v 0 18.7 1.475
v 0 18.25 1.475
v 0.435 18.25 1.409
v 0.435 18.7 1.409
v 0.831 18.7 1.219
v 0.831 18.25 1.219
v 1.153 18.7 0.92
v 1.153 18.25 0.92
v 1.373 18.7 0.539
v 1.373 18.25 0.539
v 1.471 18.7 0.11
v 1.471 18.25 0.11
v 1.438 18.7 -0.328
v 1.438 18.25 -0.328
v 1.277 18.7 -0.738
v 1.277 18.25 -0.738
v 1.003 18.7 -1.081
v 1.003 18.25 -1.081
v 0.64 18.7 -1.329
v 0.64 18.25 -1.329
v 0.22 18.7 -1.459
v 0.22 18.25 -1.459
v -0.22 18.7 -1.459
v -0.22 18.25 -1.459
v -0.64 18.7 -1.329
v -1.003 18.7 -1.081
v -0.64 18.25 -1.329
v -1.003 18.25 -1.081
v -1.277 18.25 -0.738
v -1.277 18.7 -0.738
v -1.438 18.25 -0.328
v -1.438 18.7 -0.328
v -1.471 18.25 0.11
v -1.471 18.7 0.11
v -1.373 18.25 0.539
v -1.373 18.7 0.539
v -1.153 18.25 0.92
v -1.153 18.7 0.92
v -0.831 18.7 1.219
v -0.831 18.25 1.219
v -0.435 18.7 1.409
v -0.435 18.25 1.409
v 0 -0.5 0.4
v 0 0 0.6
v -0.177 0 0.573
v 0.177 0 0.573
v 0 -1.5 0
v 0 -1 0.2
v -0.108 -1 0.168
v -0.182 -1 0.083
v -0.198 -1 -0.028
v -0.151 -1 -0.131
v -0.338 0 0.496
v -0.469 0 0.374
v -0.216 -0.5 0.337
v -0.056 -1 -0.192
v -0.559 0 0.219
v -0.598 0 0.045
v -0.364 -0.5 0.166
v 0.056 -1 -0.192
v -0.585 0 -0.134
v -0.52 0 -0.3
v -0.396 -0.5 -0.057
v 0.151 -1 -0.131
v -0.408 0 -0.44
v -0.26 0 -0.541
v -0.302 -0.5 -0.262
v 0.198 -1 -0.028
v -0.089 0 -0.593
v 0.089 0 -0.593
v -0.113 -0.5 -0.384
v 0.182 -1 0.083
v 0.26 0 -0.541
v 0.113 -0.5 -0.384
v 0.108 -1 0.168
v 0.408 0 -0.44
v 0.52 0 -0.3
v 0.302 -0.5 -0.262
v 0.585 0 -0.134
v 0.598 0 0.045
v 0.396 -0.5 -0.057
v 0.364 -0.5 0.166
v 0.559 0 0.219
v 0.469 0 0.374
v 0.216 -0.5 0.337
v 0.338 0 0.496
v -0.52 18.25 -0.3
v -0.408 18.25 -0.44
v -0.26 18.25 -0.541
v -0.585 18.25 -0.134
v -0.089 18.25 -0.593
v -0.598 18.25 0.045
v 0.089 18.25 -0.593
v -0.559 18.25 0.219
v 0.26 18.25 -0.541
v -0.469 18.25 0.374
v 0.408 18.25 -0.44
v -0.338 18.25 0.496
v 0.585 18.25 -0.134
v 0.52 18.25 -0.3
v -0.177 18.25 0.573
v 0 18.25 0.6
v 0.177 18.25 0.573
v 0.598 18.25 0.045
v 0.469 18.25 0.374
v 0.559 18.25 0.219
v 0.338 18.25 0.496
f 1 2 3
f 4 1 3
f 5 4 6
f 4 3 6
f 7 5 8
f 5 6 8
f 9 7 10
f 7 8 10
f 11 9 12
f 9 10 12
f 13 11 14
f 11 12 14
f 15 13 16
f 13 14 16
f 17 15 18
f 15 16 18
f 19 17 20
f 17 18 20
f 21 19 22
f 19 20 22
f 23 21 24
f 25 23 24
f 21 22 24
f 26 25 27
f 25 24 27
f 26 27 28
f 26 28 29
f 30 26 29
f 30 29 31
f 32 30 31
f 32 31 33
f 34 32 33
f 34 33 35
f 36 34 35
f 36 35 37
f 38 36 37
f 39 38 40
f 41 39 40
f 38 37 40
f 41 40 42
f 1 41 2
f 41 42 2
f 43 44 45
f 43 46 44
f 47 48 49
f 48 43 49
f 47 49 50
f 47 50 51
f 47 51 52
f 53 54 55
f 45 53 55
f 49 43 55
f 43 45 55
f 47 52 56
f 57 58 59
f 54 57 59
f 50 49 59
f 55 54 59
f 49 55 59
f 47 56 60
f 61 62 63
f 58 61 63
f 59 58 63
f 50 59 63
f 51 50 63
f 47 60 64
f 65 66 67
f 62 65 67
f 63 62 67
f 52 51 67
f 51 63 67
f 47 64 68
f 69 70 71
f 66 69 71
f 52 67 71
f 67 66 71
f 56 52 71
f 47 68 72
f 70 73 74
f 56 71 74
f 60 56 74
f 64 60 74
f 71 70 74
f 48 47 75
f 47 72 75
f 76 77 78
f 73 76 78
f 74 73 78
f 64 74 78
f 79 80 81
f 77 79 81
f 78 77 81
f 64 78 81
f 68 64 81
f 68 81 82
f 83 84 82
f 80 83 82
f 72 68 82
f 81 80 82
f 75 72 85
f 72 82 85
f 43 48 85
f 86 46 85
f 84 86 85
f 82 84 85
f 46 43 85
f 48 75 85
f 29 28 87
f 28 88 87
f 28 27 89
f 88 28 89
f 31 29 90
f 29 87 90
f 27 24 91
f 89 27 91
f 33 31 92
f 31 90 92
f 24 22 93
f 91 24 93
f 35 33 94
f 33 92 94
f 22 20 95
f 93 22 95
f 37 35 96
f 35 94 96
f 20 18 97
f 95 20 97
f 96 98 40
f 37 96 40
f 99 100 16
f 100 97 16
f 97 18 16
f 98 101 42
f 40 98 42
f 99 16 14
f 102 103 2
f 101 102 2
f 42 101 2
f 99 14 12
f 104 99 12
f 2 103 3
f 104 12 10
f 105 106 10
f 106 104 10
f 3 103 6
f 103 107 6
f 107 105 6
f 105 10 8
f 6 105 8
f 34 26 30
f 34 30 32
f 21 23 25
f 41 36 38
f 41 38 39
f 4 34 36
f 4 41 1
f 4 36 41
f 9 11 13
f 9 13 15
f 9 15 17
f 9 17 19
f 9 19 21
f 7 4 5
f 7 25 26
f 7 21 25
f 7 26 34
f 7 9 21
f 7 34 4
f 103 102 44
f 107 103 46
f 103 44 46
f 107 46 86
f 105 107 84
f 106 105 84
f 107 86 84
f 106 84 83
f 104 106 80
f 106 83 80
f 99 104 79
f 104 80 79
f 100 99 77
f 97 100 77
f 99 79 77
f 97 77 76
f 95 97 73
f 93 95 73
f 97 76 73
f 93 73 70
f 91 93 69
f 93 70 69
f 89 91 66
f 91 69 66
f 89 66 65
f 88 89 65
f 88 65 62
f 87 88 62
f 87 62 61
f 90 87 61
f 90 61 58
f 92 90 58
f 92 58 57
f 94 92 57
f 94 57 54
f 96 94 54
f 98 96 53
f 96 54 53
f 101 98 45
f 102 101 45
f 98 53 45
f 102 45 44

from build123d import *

# Parameters (mm, degrees)
SKETCH1_R           = 0.6
BOSS_EXTRUDE1_DEPTH = 18.25
SKETCH2_R           = 1.475
BOSS_EXTRUDE2_DEPTH = 0.45


with BuildPart() as part:
    # Sketch1 → Boss-Extrude1 (new body)
    with BuildSketch(Plane(origin=(0, 0, 0), x_dir=(1, 0, 0), z_dir=(0, 1, 0))):
        with Locations(Location((0, 0, 0), (0, 0, 270))):
            Circle(SKETCH1_R)
    extrude(amount=BOSS_EXTRUDE1_DEPTH)

    # Sketch2 → Boss-Extrude2 (add)
    with BuildSketch(Plane(origin=(0, 18.25, 0), x_dir=(1, 0, 0), z_dir=(0, 1, 0))):
        with Locations(Location((0, 0, 0), (0, 0, 270))):
            Circle(SKETCH2_R)
    extrude(amount=BOSS_EXTRUDE2_DEPTH)

    # Sketch4 → Revolve1 (revolve)
    with BuildSketch(Plane(origin=(0, 0, 0), x_dir=(0, 0, -1), z_dir=(1, 0, 0)), mode=Mode.PRIVATE) as revolve1_sk:
        Polygon((0, 0), (0, -1.5), (0.6, 0), align=None)
    revolve(revolve1_sk.sketch.rotate(Axis((0, 0, 0), (0, -1, 0)), 180), axis=Axis((0, 0, 0), (0, -1, 0)))


solid = part.part
